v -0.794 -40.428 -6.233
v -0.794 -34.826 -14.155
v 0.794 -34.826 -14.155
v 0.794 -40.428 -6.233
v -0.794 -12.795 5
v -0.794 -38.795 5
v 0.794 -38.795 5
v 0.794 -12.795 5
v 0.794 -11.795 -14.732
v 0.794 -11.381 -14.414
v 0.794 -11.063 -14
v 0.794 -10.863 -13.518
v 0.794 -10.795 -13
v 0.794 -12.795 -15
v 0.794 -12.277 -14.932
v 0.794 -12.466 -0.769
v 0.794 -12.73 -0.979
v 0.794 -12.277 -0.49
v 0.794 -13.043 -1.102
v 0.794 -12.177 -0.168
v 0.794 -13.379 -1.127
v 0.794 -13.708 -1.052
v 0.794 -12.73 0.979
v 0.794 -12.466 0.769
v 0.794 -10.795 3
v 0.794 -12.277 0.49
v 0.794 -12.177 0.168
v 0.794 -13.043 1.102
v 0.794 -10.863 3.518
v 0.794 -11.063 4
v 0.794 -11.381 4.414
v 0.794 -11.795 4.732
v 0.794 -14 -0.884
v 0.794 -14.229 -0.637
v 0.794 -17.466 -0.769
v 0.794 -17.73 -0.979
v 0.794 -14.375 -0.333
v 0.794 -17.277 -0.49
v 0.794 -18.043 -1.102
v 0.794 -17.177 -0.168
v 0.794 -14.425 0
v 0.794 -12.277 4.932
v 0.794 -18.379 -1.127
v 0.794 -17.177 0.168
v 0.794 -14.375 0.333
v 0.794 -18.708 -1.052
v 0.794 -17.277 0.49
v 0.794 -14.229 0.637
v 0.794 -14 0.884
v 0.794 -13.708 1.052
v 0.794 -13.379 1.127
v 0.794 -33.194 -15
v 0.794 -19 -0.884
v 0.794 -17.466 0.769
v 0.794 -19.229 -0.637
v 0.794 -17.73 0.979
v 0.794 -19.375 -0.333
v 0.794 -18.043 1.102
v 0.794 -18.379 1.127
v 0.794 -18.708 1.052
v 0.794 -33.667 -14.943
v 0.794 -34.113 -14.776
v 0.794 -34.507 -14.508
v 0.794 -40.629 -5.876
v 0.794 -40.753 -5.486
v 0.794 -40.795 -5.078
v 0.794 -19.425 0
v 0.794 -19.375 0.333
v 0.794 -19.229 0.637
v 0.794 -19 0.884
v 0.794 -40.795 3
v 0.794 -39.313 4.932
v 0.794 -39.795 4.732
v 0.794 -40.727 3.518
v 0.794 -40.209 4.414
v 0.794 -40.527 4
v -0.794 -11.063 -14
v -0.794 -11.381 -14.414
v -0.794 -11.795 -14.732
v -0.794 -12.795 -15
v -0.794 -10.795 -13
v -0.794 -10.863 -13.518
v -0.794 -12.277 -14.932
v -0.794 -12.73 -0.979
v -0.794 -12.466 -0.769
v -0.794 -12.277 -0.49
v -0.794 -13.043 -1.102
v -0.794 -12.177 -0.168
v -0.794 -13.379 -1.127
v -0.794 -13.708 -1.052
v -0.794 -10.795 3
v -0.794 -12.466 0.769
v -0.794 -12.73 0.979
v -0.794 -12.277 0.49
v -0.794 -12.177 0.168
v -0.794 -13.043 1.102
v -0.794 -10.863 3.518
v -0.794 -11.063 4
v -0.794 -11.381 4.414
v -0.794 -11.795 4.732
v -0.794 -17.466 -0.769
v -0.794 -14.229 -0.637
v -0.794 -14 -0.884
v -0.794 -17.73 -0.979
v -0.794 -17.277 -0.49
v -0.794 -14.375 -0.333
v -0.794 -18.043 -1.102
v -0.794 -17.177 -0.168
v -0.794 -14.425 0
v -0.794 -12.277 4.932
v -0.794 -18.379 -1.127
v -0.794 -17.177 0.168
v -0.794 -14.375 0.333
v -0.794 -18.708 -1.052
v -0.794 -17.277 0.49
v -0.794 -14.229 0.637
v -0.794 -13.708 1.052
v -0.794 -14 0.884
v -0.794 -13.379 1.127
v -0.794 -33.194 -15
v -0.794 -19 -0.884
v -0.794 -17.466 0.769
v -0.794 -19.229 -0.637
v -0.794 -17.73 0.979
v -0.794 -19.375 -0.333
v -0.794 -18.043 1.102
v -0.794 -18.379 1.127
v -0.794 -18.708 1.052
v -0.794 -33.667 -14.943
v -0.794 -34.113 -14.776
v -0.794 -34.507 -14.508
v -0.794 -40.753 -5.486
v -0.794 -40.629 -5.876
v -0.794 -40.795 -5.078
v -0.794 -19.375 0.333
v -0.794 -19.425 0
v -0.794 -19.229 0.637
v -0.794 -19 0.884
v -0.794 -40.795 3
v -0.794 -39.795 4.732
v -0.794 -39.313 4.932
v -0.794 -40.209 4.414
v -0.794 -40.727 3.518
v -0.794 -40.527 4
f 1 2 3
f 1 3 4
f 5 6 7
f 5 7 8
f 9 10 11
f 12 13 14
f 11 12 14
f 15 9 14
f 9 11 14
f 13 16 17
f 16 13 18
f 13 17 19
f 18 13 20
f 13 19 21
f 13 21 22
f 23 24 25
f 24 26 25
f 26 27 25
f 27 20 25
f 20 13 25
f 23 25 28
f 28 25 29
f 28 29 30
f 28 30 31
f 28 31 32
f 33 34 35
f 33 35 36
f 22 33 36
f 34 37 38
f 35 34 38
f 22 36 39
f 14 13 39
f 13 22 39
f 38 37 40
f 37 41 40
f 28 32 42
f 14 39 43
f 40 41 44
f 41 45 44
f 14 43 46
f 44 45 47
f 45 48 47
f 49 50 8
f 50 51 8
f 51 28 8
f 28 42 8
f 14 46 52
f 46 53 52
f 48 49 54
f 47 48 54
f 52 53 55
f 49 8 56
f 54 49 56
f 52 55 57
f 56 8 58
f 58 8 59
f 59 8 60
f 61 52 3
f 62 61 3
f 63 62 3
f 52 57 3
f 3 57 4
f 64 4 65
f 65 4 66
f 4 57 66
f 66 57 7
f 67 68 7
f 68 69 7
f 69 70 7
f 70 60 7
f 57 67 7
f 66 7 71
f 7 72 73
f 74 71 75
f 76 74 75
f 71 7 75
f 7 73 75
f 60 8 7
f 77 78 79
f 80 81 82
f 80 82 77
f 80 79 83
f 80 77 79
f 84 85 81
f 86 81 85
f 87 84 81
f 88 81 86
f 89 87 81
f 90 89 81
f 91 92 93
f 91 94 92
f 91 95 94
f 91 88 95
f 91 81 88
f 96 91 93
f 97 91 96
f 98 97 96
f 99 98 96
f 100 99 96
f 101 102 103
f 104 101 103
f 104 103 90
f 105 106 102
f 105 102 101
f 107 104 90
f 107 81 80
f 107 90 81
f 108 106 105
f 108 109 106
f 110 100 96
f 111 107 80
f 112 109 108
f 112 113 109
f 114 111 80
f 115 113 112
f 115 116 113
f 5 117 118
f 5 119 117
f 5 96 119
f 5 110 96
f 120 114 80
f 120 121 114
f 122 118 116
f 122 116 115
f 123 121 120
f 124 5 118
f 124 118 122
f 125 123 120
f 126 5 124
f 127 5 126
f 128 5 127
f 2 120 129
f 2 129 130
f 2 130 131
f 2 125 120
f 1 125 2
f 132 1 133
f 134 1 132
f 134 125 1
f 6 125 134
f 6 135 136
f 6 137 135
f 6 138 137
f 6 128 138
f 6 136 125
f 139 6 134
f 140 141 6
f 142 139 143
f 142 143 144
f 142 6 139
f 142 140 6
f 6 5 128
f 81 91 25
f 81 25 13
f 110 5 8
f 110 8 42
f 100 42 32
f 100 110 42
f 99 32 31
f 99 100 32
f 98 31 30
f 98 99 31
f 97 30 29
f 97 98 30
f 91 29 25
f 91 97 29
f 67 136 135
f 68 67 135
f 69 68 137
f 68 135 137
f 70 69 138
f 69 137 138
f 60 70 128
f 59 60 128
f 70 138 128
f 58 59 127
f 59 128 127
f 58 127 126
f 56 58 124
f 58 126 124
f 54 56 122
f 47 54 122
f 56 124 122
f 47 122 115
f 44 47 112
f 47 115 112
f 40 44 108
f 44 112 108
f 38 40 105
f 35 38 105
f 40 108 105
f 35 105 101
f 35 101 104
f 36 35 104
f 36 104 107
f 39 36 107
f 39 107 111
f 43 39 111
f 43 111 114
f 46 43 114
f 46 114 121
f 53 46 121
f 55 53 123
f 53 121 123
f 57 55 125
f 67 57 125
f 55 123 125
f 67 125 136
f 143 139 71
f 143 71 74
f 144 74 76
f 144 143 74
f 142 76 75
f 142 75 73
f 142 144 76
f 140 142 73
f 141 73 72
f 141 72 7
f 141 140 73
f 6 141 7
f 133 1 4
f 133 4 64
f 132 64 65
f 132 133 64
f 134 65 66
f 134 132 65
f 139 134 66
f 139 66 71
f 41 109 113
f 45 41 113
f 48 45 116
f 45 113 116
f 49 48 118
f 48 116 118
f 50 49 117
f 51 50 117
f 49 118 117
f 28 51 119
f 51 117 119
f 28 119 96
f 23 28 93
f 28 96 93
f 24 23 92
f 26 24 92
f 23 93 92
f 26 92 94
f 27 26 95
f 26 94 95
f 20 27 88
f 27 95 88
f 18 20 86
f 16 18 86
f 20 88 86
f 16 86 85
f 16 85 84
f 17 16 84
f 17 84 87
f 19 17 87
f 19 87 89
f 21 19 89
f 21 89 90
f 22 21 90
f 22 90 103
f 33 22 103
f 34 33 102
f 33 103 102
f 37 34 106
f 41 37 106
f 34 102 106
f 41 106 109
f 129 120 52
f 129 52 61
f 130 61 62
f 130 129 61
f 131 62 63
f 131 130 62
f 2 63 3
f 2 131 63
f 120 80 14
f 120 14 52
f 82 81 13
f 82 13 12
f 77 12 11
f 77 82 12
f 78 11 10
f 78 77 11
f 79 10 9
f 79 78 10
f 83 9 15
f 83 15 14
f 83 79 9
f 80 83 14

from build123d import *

# Parameters (mm, degrees)
SKETCH_1_R      = 1.1303
EXTRUDE_1_DEPTH = 1.588


with BuildPart() as part:
    # 草图1 → 凸台-拉伸1 (new body)
    with BuildSketch(Plane(origin=(-0.79375, 0, 0), x_dir=(0, -1, 0), z_dir=(-1, 0, 0))):
        with BuildLine():
            Line((40.795, -5.078289511), (40.795, 3))
            ThreePointArc((40.795, 3), (40.209213562, 4.414213562), (38.795, 5))
            Line((38.795, 5), (12.795, 5))
            ThreePointArc((12.795, 5), (11.380786438, 4.414213562), (10.795, 3))
            Line((10.795, 3), (10.795, -13))
            ThreePointArc((10.795, -13), (11.380786438, -14.414213562), (12.795, -15))
            Line((12.795, -15), (33.193504795, -15))
            ThreePointArc((33.193504795, -15), (34.112906481, -14.776147668), (34.826497957, -14.154700538))
            Line((34.826497957, -14.154700538), (40.427993162, -6.232990049))
            ThreePointArc((40.427993162, -6.232990049), (40.701041228, -5.684100404), (40.795, -5.078289511))
        make_face()
        with Locations((18.295, 0)):
            Circle(SKETCH_1_R, mode=Mode.SUBTRACT)
        with Locations((13.295, 0)):
            Circle(SKETCH_1_R, mode=Mode.SUBTRACT)
    extrude(amount=-EXTRUDE_1_DEPTH)


solid = part.part
